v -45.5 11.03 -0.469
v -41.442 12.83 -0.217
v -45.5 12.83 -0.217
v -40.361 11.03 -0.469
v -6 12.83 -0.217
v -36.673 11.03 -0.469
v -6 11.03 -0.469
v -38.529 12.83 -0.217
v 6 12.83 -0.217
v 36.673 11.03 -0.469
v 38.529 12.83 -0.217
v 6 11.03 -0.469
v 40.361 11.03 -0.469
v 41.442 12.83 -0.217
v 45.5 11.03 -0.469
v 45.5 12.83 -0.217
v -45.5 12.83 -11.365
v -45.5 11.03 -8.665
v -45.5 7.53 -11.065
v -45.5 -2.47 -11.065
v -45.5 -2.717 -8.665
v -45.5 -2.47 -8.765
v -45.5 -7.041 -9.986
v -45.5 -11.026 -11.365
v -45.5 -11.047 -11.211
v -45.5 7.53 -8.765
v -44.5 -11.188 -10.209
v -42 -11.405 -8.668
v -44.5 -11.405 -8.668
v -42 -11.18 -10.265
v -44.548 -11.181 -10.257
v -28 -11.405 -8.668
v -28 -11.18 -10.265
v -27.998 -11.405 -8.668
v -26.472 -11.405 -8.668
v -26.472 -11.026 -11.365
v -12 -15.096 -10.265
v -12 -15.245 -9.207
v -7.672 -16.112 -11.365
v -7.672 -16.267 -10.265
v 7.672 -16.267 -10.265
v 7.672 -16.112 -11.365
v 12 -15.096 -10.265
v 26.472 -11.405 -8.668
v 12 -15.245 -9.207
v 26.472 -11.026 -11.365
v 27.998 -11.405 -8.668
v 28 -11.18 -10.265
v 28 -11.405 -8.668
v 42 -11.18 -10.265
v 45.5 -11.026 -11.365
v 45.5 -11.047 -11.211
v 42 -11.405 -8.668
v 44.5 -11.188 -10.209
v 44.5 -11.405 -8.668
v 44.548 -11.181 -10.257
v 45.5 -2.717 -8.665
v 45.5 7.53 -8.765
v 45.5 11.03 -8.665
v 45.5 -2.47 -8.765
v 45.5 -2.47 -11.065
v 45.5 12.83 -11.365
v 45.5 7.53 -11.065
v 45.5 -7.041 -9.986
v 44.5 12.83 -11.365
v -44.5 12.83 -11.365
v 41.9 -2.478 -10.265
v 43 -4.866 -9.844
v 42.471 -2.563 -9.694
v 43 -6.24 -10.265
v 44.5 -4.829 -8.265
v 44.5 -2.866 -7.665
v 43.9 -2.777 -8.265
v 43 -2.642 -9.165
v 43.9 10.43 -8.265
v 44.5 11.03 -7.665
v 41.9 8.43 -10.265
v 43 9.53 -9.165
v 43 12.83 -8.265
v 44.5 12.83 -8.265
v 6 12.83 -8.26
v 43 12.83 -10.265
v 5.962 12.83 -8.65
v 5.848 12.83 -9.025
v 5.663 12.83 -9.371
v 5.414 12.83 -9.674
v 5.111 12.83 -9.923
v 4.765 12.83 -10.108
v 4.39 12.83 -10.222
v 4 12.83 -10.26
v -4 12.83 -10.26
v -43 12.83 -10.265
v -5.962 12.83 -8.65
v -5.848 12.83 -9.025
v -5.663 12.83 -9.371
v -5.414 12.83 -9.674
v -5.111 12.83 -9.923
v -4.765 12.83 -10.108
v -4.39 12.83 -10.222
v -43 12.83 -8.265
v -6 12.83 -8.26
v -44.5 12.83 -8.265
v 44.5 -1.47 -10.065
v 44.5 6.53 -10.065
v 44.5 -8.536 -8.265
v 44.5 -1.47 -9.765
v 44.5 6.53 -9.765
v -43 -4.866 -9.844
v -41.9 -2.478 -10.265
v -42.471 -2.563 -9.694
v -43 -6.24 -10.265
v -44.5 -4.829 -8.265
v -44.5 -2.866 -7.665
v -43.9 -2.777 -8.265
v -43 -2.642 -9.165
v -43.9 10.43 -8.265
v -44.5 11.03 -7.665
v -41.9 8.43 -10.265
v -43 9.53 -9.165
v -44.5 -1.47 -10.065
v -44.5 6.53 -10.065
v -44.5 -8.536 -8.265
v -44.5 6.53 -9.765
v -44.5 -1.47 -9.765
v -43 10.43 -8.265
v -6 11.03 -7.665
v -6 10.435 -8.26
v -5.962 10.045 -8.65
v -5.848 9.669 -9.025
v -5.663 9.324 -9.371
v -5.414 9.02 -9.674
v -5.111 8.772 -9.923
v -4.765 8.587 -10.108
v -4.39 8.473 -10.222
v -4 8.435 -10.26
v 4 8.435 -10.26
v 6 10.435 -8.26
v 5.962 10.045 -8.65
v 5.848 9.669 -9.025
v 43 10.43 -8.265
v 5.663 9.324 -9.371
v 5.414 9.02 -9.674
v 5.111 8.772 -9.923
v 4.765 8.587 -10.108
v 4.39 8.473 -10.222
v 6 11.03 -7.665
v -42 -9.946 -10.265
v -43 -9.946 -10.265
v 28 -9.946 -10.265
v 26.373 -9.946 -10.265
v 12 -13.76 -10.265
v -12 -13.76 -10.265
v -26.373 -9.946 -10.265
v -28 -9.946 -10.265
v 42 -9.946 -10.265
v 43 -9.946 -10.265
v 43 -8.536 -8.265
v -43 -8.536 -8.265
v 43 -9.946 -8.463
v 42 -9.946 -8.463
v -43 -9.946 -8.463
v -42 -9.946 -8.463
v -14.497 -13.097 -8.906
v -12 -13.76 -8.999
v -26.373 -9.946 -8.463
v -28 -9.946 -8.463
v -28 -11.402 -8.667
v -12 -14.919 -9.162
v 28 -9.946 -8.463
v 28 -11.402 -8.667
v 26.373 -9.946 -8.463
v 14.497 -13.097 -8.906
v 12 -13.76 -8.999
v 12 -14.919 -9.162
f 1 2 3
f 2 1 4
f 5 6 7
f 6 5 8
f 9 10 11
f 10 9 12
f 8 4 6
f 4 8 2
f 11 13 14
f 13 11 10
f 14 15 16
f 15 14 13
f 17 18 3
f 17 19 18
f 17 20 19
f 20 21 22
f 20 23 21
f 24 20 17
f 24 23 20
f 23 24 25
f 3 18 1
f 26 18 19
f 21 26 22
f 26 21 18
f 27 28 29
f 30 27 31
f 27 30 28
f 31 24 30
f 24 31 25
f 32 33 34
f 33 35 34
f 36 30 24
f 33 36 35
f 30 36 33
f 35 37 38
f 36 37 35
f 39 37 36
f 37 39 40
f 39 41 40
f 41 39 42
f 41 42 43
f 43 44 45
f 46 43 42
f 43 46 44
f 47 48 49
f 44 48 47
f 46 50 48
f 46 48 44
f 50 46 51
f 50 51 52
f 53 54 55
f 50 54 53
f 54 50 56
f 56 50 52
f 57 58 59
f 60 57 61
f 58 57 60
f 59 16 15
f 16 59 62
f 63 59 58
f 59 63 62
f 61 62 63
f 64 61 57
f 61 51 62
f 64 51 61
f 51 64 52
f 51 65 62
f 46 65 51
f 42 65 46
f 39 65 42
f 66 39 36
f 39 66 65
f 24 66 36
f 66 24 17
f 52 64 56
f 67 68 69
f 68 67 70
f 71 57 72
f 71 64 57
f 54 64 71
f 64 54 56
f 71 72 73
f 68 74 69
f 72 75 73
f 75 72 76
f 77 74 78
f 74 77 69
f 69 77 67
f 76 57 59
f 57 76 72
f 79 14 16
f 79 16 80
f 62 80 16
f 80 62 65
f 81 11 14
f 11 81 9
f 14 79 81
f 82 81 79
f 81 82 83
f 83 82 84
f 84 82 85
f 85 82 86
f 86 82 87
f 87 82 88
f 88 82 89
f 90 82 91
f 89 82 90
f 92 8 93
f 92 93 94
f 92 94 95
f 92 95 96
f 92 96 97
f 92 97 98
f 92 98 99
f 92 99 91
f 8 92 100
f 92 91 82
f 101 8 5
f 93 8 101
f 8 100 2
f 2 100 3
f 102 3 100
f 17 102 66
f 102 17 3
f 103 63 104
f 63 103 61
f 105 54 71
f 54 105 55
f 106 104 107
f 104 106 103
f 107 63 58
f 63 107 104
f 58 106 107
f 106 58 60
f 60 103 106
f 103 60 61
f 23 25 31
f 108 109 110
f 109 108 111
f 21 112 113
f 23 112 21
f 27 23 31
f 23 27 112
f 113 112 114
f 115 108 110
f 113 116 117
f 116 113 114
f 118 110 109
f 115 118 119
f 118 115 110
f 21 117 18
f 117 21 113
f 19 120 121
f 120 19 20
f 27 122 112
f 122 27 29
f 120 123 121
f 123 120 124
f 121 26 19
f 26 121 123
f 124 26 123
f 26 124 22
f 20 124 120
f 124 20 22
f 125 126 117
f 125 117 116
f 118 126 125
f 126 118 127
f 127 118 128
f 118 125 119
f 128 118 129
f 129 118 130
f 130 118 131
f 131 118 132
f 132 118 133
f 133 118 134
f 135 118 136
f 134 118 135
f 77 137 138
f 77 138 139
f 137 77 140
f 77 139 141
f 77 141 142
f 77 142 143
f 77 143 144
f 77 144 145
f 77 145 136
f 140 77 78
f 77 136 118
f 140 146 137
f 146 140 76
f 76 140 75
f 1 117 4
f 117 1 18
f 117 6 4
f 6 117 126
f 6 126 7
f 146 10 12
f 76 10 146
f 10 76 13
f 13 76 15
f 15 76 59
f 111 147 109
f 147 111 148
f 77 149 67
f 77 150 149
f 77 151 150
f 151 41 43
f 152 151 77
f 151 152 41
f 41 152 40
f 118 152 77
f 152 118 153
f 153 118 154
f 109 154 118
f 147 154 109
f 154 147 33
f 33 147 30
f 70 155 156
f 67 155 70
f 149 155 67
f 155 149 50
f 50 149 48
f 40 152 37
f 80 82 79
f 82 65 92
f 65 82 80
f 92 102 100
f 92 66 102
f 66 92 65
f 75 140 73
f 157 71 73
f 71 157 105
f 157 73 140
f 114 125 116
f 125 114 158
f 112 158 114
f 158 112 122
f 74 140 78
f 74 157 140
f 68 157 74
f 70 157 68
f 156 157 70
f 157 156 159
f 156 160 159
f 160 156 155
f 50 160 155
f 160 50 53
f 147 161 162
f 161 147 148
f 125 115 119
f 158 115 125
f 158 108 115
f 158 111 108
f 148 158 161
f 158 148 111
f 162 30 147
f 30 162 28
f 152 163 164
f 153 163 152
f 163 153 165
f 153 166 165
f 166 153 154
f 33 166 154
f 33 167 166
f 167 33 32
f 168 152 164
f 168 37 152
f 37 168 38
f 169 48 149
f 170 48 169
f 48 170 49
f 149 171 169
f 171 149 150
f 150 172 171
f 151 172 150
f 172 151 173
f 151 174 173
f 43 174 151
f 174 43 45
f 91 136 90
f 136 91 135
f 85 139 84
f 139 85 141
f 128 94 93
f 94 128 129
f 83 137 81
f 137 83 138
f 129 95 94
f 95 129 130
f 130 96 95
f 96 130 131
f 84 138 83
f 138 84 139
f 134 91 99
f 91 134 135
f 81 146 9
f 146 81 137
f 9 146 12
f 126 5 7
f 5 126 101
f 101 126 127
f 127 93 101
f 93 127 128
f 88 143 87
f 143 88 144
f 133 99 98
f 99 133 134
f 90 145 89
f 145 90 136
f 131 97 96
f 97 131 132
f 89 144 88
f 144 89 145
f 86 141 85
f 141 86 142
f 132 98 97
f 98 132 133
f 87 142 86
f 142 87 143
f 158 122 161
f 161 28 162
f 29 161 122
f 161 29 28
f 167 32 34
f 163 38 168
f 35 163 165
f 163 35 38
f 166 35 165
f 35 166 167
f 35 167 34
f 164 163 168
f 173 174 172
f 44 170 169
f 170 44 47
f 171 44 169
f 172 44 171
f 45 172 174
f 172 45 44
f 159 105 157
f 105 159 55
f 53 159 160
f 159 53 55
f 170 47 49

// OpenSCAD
include <drink-me.scad>

base_clearance_xy = 0.5;
base_back_thickness = 1.8;
base_clip_neg_inset_z = 0.7;

present() {
     base_3d(rest=false);
}
